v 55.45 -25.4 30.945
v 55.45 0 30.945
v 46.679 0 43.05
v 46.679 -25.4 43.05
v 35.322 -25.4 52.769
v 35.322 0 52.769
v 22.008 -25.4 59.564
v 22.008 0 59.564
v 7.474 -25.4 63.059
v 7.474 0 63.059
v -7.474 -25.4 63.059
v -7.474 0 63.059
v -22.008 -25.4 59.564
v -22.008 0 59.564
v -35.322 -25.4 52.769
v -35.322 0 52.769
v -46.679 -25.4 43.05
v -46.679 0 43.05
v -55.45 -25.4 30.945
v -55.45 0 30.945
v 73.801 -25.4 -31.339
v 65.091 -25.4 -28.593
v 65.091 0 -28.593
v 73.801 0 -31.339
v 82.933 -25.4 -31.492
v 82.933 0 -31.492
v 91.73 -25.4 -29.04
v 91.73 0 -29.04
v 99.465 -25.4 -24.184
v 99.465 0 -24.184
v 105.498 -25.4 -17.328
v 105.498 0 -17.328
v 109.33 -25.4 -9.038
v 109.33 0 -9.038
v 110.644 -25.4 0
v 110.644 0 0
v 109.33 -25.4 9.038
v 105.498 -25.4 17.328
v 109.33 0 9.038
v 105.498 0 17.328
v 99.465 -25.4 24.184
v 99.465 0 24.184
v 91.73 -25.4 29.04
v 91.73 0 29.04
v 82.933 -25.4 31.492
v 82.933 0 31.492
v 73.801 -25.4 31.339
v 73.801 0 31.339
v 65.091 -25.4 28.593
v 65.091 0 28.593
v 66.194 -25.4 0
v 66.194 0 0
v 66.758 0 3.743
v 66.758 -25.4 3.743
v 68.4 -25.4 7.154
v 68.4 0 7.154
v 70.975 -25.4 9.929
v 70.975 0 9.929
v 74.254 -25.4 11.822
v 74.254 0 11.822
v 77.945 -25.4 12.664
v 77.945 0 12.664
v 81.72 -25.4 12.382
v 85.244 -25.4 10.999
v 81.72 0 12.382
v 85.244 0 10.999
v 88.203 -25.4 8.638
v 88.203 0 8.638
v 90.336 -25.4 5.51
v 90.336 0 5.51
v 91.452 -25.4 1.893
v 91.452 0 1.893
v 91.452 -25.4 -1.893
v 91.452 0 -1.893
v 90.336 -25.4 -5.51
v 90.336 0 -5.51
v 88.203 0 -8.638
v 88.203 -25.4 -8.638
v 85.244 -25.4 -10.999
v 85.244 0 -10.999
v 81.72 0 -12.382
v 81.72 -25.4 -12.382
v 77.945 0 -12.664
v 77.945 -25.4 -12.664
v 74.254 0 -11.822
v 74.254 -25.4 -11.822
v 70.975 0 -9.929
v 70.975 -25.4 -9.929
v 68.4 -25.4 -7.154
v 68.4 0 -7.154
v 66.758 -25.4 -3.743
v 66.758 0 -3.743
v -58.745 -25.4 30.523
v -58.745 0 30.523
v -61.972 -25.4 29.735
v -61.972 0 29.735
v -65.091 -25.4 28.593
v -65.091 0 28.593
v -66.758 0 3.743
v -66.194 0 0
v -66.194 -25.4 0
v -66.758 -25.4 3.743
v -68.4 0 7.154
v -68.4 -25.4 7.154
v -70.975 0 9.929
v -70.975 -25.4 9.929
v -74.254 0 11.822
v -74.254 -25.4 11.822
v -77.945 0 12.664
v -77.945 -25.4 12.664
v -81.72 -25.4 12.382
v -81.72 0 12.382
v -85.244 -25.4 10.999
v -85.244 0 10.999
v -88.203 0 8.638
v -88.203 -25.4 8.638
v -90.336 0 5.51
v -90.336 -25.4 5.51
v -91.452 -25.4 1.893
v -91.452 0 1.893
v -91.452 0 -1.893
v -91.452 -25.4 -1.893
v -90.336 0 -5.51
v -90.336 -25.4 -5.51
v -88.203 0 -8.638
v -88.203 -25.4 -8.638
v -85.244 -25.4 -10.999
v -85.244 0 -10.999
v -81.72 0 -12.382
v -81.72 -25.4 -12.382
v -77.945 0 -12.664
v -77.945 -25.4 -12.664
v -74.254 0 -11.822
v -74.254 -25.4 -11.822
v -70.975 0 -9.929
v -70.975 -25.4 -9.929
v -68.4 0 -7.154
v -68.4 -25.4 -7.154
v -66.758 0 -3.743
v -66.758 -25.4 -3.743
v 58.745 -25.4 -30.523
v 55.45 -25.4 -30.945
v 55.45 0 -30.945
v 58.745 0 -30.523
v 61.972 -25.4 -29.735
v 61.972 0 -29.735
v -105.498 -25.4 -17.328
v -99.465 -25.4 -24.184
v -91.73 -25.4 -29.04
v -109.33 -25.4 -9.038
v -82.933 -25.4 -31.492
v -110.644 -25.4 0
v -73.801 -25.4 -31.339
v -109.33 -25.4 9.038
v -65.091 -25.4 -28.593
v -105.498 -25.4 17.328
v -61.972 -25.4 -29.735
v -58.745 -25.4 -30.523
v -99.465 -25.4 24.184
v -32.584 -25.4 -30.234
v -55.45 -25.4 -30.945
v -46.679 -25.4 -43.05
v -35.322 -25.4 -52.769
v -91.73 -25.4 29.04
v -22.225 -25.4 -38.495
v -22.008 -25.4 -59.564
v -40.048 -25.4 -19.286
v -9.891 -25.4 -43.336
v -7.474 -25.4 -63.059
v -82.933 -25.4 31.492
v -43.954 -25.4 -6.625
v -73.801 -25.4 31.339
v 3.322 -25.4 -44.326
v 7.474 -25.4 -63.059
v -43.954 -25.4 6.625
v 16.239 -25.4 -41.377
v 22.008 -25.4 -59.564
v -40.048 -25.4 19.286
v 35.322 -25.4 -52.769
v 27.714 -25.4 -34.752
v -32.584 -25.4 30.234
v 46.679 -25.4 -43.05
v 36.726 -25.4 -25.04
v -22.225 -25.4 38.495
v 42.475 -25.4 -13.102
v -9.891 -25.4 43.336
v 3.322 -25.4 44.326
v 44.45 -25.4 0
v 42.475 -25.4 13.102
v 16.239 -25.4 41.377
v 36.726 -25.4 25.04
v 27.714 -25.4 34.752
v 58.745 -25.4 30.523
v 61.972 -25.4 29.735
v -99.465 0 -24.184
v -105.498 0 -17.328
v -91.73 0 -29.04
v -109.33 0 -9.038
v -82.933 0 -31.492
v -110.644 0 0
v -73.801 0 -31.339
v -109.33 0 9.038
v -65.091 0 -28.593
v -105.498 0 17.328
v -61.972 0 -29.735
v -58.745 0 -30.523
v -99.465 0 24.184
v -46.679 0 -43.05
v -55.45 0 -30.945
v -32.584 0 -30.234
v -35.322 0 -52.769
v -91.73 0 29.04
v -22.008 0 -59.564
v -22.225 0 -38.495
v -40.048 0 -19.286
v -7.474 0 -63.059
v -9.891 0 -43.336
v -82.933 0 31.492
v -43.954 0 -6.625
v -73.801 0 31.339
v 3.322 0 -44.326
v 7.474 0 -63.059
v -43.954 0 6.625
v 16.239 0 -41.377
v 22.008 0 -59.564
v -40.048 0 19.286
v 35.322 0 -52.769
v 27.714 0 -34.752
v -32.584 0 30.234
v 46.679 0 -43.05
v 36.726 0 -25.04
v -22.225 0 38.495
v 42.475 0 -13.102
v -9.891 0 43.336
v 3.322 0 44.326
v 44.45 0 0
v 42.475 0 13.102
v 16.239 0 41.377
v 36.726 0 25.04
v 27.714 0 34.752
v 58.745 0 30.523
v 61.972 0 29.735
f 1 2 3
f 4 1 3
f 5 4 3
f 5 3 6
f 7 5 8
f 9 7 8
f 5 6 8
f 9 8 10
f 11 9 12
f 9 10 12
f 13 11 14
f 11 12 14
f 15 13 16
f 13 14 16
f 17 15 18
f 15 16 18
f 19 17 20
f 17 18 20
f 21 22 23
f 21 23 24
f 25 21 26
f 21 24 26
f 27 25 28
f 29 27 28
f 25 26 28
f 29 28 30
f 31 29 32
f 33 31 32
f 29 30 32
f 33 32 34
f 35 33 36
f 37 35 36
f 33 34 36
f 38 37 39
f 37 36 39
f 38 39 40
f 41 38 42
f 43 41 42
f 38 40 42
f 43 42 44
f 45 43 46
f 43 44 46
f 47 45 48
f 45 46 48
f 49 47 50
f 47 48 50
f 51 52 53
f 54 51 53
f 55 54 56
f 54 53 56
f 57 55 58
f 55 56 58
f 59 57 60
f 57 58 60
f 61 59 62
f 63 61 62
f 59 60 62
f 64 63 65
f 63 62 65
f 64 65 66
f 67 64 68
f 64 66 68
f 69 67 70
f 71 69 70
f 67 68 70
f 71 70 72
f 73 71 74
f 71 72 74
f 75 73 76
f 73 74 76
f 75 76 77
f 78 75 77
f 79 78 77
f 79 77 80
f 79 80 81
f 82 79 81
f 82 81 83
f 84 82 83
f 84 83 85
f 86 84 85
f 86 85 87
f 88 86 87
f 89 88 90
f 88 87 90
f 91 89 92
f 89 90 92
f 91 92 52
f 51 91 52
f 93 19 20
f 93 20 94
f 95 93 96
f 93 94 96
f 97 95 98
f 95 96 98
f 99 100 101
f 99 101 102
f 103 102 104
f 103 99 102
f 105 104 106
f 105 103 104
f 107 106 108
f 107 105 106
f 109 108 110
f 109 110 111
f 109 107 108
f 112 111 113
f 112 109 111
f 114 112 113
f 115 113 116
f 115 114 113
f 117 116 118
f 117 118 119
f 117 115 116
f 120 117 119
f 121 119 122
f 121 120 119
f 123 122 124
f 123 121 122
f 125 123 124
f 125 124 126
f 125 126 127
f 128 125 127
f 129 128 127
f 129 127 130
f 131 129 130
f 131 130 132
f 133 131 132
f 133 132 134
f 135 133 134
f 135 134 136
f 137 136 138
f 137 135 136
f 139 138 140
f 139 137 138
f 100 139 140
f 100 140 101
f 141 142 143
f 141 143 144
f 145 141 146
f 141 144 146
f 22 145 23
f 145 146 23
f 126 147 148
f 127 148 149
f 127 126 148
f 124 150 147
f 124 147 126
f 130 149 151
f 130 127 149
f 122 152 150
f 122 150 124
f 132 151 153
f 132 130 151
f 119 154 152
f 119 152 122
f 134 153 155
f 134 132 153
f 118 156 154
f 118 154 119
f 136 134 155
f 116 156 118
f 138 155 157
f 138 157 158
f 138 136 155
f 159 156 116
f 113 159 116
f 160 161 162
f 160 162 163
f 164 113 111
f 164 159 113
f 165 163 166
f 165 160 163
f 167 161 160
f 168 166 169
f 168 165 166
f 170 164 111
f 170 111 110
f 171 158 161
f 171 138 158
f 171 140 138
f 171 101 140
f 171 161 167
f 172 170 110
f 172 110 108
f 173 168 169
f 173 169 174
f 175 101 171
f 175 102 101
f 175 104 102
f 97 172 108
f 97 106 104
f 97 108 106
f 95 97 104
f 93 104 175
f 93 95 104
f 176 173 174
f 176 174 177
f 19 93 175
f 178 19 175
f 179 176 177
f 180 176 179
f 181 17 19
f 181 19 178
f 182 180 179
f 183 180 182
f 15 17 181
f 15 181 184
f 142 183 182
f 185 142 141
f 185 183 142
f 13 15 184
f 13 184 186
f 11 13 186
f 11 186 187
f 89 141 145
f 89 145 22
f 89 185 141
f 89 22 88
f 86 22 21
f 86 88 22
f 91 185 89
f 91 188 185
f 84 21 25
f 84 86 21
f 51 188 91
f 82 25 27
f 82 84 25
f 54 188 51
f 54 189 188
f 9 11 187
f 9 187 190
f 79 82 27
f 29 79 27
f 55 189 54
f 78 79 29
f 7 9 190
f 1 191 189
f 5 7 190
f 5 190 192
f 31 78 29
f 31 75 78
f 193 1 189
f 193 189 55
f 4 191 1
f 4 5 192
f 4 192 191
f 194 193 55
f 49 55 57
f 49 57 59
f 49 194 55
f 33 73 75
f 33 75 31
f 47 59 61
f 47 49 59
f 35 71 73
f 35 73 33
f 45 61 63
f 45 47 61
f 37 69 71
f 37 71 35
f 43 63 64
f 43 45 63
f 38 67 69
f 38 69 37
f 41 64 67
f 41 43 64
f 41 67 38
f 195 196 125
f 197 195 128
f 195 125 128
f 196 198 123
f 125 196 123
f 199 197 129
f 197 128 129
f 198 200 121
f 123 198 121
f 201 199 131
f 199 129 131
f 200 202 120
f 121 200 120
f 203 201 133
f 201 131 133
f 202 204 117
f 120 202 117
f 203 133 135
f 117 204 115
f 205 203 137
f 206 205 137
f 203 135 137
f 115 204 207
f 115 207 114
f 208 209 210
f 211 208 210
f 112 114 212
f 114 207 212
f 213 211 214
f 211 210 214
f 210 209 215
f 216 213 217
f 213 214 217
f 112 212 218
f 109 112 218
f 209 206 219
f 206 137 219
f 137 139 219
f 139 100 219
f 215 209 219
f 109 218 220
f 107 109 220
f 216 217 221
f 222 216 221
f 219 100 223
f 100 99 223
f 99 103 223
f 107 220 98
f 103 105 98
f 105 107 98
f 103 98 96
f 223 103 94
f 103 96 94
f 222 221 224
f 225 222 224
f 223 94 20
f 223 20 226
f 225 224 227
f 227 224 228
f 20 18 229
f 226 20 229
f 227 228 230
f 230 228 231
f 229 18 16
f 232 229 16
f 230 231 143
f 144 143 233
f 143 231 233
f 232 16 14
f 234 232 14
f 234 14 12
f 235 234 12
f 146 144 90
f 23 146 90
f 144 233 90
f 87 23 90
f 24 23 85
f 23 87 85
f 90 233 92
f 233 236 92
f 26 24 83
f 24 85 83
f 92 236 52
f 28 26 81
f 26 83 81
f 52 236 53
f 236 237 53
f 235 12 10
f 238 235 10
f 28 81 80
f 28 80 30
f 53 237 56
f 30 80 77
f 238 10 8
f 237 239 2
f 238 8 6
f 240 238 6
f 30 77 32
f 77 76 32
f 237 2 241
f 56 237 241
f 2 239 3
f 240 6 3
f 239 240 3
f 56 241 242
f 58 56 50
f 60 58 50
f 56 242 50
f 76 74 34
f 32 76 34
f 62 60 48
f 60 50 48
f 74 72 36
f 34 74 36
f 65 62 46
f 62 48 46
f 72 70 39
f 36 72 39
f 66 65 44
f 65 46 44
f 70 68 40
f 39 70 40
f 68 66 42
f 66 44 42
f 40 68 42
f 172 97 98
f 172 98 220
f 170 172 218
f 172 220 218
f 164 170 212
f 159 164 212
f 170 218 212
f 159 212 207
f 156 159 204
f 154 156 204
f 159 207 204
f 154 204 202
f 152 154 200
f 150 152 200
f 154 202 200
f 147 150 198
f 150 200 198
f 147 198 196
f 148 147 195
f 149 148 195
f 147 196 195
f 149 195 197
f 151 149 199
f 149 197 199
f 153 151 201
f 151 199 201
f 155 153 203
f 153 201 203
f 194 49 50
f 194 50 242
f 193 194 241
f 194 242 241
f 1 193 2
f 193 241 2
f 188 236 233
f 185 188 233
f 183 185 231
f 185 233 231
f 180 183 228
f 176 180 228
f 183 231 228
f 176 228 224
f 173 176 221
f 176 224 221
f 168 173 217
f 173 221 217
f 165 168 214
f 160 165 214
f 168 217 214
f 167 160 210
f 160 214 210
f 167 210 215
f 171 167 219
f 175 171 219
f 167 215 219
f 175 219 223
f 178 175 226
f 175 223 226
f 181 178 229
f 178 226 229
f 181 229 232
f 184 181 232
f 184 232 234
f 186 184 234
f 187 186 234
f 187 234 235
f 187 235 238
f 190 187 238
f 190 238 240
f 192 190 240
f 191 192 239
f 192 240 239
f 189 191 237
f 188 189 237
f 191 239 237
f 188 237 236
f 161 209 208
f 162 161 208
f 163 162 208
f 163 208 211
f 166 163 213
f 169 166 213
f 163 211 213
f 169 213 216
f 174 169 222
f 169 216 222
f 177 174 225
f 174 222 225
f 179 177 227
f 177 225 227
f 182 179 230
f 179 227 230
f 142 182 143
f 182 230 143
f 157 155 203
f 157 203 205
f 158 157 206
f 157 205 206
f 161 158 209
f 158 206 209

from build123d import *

# Parameters (mm, degrees)
F0_R     = 12.7
F1_DEPTH = 25.4


with BuildPart() as f1:
    # F0 (on Front) → F1 (new body)
    with BuildSketch(Plane.XZ):
        with BuildLine():
            ThreePointArc((-55.4496511867, 30.9448894533), (-61.4544662753, 15.9874505417), (-63.5, 0))
            ThreePointArc((-63.5, 0), (-61.4544662753, -15.9874505417), (-55.4496511867, -30.9448894533))
            ThreePointArc((-55.4496511867, -30.9448894533), (0, -63.5), (55.4496511867, -30.9448894533))
            ThreePointArc((55.4496511867, -30.9448894533), (60.3691549173, -30.174180923), (65.0908594106, -28.5927210679))
            ThreePointArc((65.0908594106, -28.5927210679), (110.6437142577, 0), (65.0908594106, 28.5927210679))
            ThreePointArc((65.0908594106, 28.5927210679), (60.3691549173, 30.174180923), (55.4496511867, 30.9448894533))
            ThreePointArc((55.4496511867, 30.9448894533), (0, 63.5), (-55.4496511867, 30.9448894533))
        make_face()
        with BuildLine():
            ThreePointArc((-44.45, 0), (0, 44.45), (44.45, 0))
            ThreePointArc((44.45, 0), (0, -44.45), (-44.45, 0))
        make_face(mode=Mode.SUBTRACT)
        with BuildLine():
            ThreePointArc((91.5937142577, 0), (78.8937142577, -12.7), (66.1937142577, 0))
            ThreePointArc((66.1937142577, 0), (78.8937142577, 12.7), (91.5937142577, 0))
        make_face(mode=Mode.SUBTRACT)
        with BuildLine():
            ThreePointArc((-55.4496511867, -30.9448894533), (-61.4544662753, -15.9874505417), (-63.5, 0))
            ThreePointArc((-63.5, 0), (-61.4544662753, 15.9874505417), (-55.4496511867, 30.9448894533))
            ThreePointArc((-55.4496511867, 30.9448894533), (-60.3691549173, 30.174180923), (-65.0908594106, 28.5927210679))
            ThreePointArc((-65.0908594106, 28.5927210679), (-110.6437142577, 0), (-65.0908594106, -28.5927210679))
            ThreePointArc((-65.0908594106, -28.5927210679), (-60.3691549173, -30.174180923), (-55.4496511867, -30.9448894533))
        make_face()
        with Locations((-78.8937142577, 0)):
            Circle(F0_R, mode=Mode.SUBTRACT)
    extrude(amount=F1_DEPTH)


solid = f1.part
